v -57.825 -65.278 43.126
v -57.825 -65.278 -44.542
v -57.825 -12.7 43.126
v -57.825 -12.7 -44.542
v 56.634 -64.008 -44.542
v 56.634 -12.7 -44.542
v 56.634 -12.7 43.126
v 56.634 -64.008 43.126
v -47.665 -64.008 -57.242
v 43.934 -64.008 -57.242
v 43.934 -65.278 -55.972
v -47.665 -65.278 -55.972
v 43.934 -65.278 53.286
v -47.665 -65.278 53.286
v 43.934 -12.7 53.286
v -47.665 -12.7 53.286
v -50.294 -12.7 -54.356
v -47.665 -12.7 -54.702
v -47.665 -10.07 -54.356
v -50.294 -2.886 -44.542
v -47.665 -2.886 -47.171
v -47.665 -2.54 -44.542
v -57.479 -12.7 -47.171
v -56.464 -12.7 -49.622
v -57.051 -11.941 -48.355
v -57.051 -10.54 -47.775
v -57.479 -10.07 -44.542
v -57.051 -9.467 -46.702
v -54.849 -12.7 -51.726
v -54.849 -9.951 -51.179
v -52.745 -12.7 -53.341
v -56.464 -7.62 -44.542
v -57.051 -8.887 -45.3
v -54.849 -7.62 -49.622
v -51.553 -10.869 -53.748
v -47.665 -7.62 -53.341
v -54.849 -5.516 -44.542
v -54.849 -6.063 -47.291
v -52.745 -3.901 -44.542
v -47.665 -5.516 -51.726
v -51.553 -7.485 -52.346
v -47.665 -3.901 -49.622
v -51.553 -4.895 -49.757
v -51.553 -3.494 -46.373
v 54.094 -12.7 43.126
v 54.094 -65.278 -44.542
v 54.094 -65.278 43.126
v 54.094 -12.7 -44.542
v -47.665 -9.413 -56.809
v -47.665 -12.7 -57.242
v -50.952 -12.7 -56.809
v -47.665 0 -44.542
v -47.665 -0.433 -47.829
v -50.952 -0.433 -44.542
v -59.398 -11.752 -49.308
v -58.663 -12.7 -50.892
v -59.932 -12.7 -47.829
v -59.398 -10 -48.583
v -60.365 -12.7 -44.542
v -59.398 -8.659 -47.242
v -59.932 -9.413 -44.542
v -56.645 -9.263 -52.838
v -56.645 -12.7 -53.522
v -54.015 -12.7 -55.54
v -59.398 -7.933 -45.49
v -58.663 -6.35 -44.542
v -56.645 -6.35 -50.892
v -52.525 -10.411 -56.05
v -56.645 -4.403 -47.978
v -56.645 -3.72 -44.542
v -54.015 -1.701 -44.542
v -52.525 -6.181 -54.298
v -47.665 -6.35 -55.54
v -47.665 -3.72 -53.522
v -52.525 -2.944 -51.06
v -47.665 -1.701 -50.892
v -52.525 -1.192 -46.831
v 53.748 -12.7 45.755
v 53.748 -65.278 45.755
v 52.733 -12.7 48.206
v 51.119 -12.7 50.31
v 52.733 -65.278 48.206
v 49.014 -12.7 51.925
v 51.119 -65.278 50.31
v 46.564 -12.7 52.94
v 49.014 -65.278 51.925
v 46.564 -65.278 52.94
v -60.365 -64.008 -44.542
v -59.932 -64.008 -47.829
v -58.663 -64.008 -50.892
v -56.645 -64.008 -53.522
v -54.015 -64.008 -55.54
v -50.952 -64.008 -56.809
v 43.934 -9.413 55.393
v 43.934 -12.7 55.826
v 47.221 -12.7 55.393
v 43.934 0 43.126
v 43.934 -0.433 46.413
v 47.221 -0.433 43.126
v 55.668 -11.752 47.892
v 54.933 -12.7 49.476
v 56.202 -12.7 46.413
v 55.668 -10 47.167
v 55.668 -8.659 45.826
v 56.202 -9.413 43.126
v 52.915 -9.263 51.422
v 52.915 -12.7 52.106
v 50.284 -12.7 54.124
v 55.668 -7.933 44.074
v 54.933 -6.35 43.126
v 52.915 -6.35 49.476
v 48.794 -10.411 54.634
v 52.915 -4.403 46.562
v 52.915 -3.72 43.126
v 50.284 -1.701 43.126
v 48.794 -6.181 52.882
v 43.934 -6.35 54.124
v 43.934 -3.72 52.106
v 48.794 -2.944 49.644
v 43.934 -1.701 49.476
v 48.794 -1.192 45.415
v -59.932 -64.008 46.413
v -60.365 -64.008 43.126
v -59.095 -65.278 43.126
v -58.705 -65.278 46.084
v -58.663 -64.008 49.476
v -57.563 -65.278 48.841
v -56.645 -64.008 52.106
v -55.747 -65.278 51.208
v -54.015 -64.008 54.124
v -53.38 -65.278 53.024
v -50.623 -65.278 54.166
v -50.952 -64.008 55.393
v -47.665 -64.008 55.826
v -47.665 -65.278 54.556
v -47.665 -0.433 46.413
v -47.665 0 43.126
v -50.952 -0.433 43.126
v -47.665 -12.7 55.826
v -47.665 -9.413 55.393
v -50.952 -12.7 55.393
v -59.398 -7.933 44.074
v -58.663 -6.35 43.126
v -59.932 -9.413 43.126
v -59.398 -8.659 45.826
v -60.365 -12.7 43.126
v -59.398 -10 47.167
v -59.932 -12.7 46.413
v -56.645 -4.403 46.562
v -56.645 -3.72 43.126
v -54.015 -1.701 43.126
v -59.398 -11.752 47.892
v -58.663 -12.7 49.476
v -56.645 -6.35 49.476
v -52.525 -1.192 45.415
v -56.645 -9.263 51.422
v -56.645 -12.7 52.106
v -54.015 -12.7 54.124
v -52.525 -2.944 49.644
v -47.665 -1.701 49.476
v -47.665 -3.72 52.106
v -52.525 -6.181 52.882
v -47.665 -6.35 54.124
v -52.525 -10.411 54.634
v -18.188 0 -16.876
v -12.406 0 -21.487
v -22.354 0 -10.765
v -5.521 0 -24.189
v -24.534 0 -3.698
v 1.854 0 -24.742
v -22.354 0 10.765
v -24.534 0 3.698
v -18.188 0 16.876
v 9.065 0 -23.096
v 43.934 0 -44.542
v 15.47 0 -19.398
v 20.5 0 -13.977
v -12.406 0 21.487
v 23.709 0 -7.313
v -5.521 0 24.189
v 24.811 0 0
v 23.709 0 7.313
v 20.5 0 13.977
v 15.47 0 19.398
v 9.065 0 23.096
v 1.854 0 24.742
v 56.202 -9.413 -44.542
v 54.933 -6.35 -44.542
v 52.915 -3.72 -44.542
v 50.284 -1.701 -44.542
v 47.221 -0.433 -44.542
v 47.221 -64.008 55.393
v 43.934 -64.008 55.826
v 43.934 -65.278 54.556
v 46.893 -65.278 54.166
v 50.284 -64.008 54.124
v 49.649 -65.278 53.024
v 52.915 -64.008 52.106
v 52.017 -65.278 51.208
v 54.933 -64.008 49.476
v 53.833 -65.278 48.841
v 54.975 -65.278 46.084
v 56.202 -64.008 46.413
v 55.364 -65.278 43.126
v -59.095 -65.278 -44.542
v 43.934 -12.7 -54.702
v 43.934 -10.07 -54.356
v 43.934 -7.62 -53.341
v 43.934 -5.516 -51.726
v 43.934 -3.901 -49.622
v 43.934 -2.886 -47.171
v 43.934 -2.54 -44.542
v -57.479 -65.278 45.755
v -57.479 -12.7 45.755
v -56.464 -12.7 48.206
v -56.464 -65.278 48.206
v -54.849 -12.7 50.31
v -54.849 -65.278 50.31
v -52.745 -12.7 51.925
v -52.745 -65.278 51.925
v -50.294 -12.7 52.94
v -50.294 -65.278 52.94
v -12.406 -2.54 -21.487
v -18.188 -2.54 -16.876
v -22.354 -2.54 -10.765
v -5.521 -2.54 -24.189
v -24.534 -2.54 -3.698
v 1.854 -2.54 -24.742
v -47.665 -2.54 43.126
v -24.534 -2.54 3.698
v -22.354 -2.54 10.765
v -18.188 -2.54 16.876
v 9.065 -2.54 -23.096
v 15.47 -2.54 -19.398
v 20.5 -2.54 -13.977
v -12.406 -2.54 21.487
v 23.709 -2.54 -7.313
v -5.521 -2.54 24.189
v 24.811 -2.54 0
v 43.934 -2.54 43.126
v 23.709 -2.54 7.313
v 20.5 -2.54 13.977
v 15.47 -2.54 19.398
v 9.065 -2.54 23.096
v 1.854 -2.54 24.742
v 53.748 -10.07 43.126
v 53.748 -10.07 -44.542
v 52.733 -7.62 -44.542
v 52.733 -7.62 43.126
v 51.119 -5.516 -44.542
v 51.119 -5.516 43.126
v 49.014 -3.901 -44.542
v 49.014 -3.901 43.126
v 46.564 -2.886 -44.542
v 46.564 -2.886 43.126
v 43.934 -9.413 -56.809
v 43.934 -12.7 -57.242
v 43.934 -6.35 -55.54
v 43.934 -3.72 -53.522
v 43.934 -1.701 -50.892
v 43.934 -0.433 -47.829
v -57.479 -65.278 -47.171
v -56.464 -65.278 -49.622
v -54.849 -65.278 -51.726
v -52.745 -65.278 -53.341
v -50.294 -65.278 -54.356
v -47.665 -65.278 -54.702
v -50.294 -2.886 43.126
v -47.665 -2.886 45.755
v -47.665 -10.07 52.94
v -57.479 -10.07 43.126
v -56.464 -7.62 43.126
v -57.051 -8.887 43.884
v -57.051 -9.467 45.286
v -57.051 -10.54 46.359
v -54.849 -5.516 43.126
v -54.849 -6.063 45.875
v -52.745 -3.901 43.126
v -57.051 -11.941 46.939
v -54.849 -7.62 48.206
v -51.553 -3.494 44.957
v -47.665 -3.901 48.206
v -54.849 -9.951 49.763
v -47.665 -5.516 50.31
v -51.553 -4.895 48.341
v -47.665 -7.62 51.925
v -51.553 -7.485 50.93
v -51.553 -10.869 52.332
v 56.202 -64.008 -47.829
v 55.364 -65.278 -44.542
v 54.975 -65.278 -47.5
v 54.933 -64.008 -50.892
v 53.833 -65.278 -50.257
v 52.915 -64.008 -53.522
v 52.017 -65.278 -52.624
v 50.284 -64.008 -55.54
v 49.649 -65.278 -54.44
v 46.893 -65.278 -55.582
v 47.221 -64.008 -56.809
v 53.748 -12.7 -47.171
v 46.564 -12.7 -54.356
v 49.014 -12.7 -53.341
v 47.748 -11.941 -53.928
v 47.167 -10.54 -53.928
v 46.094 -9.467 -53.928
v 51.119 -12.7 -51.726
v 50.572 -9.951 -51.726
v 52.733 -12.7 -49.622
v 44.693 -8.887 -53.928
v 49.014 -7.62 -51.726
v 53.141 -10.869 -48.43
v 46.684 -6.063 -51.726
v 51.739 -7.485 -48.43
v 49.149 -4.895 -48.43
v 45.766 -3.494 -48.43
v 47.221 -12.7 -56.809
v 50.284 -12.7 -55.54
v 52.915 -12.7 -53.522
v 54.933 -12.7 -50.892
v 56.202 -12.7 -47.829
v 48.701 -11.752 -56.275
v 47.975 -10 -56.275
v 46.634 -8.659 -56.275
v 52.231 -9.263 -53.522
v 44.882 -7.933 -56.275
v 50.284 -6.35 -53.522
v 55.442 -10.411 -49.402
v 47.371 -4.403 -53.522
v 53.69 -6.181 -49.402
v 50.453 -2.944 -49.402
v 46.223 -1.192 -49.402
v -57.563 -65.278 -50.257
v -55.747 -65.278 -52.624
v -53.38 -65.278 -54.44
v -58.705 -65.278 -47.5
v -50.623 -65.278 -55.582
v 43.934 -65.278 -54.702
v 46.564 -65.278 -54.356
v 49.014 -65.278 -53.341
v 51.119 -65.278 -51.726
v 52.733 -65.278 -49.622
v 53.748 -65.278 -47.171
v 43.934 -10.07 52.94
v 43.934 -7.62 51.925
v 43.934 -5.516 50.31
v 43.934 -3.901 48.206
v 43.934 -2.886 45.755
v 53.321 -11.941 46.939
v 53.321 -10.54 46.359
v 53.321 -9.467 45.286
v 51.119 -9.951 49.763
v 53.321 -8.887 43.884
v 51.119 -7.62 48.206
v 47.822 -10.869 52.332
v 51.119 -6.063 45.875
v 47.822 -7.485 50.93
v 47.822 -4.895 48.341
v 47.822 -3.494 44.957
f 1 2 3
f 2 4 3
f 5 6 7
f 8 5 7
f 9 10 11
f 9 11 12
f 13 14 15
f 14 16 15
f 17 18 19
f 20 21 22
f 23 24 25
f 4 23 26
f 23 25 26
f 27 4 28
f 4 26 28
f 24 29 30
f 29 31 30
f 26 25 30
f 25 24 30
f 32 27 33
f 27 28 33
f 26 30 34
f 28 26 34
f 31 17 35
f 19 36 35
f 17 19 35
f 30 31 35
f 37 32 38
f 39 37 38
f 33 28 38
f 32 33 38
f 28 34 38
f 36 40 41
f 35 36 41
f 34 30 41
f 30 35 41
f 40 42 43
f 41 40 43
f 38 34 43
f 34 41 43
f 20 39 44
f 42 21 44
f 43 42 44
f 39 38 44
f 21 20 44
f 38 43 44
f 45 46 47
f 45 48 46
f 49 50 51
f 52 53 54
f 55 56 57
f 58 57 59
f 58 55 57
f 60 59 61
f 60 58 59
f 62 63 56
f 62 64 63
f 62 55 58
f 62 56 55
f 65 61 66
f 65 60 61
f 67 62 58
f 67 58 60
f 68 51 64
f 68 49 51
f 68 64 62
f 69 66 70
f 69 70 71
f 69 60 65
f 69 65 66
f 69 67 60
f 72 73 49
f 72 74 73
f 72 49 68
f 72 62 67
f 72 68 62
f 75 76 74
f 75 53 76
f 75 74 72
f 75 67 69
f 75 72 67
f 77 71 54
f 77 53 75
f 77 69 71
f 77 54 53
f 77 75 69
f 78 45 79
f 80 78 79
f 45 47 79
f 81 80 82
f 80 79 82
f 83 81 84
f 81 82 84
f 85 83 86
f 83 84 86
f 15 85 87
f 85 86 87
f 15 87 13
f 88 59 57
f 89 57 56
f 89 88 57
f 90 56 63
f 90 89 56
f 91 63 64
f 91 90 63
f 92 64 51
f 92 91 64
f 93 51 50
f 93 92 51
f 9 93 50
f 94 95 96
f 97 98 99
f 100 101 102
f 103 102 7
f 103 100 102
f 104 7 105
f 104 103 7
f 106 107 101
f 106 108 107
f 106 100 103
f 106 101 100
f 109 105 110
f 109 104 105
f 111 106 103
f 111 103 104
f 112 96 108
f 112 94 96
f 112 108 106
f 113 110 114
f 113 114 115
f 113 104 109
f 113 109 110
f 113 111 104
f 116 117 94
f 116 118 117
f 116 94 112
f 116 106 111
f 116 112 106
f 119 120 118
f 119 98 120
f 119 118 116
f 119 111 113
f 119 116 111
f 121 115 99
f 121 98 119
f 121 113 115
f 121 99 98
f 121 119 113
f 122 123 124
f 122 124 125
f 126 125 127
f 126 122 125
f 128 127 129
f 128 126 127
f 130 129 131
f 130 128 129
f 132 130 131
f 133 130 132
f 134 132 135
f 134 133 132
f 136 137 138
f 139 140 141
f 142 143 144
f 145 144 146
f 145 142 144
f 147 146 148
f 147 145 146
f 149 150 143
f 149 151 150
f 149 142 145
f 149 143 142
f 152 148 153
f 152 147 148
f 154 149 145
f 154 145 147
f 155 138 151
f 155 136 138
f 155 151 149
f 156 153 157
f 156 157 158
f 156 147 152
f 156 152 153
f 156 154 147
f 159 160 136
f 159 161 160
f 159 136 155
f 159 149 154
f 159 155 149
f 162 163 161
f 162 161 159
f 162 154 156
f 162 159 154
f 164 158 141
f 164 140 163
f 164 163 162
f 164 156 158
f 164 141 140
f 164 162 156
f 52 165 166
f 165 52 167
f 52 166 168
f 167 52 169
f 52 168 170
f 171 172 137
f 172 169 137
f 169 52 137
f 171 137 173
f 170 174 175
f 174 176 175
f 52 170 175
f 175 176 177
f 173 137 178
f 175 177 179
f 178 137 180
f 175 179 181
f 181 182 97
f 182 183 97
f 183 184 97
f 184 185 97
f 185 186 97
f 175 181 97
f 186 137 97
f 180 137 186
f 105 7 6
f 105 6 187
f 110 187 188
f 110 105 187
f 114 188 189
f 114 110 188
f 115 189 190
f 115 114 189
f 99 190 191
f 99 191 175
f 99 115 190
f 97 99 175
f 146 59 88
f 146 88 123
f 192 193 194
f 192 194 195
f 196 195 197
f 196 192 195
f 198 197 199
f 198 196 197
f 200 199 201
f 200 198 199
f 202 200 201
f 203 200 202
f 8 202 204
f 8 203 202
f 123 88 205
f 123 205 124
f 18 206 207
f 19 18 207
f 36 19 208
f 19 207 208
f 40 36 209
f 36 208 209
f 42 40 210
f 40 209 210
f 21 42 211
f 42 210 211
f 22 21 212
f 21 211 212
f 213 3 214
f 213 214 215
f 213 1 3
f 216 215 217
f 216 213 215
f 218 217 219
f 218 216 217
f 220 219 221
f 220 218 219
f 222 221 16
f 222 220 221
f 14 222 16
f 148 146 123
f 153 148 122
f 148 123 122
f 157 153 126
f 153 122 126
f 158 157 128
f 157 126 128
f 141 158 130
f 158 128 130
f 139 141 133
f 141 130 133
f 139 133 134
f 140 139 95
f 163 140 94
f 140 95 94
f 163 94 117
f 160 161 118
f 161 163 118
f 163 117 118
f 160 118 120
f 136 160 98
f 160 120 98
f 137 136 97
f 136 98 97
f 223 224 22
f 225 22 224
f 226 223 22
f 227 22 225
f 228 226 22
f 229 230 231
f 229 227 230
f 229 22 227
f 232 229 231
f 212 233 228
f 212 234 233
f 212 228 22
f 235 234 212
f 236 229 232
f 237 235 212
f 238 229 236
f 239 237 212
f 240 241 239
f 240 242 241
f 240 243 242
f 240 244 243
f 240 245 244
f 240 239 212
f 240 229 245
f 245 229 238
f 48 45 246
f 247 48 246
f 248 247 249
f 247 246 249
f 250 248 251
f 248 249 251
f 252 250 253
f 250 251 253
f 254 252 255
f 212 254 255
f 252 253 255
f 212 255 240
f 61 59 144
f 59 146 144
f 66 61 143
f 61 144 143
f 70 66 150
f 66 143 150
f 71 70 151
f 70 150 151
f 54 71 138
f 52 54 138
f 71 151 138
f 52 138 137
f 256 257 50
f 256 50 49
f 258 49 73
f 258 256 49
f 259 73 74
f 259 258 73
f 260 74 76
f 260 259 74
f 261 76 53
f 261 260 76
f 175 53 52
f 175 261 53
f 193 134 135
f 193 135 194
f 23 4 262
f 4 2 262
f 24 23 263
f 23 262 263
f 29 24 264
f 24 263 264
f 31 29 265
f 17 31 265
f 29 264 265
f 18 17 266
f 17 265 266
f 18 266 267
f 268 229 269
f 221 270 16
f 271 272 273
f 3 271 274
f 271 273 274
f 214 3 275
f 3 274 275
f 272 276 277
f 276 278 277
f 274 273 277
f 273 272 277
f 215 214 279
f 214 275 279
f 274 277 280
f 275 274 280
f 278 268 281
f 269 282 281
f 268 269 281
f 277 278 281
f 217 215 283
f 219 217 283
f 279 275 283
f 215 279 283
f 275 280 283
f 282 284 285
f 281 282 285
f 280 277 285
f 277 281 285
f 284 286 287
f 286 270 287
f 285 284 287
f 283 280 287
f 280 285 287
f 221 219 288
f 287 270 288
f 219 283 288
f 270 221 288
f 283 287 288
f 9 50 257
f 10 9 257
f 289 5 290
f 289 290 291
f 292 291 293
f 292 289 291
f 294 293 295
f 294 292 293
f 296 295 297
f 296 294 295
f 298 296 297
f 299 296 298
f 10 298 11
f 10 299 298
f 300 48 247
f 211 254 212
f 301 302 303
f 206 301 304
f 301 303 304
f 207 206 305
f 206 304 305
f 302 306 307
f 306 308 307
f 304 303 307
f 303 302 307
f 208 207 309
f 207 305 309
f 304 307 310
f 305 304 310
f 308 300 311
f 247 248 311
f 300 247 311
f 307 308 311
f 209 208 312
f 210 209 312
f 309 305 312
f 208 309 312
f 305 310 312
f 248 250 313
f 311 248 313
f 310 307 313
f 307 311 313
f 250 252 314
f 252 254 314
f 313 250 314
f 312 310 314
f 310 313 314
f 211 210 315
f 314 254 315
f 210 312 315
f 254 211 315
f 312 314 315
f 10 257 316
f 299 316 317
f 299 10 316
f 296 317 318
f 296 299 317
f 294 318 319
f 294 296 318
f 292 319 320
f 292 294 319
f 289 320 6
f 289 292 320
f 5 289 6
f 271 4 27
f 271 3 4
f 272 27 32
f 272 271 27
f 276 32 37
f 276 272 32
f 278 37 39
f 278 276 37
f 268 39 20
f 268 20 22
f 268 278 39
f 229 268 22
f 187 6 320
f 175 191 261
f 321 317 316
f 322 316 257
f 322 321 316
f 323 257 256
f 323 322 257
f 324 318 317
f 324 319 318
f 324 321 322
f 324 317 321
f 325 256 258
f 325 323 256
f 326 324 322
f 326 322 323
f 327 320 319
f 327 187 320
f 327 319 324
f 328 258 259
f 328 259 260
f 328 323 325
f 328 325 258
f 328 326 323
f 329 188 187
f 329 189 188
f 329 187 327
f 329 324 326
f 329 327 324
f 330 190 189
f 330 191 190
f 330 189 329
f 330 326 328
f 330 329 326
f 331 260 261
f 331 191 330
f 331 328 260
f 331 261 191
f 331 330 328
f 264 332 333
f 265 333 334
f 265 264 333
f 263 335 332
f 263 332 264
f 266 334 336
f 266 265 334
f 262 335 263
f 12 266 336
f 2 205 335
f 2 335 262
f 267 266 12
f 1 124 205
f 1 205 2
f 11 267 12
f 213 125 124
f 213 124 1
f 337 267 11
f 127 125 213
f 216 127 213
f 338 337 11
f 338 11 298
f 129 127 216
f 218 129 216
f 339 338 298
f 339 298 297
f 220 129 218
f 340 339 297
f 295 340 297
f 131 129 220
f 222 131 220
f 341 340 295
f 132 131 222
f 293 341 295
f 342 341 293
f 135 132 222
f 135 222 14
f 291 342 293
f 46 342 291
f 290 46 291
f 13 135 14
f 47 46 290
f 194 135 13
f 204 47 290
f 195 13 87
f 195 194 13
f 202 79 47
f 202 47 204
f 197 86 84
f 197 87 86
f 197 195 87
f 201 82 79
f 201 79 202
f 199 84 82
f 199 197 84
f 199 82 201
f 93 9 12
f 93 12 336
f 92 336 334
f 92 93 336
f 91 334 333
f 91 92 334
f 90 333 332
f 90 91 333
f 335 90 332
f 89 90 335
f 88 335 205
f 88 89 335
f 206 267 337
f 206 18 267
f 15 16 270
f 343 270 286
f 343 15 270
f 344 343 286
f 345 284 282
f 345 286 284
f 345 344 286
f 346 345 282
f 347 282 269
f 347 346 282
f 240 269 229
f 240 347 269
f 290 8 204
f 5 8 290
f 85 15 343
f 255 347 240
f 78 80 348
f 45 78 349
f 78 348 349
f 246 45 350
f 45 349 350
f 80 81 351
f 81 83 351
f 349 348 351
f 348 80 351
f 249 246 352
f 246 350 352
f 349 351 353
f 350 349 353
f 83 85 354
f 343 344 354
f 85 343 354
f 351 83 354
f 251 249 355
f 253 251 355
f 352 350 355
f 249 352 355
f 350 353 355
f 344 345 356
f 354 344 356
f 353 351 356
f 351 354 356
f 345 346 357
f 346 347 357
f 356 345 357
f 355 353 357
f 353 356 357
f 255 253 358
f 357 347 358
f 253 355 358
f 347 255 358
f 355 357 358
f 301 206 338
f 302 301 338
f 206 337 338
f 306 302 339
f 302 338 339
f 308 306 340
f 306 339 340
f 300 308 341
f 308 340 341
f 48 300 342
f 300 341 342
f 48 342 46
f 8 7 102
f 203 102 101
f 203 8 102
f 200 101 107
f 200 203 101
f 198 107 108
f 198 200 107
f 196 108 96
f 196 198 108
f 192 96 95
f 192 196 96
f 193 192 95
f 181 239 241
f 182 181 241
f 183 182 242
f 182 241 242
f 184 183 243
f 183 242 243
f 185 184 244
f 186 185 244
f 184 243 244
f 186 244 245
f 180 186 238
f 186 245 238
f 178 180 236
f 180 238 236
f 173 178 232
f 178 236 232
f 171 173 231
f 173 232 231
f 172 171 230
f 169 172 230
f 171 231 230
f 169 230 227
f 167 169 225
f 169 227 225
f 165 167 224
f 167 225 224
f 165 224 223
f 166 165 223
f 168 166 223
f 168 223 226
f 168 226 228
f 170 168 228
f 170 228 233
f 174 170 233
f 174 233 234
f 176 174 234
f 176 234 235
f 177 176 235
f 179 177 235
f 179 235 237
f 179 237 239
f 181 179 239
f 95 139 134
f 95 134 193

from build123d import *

# Parameters (mm, degrees)
F0_W     = 116.999064
F0_H     = 113.067575
F1_DEPTH = 65.278
F2_R     = 12.7
F3_T     = -2.54
F4_R     = 24.811163
F5_DEPTH = 64.008
F6_SIZE  = 1.27


with BuildPart() as f1:
    # F0 (on Front) → F1 (new body)
    with BuildSketch(Plane.XZ):
        with Locations((-1.865206, -0.708006)):
            Rectangle(F0_W, F0_H)
    extrude(amount=F1_DEPTH)

    # F2
    f2_edges = [f1.edges().sort_by_distance(p)[0] for p in [
        (-1.865206, 0, 55.825781),
        (56.634326, -32.639, 55.825781),
        (56.634326, 0, -0.708006),
        (56.634326, -32.639, -57.241794),
        (-1.865206, 0, -57.241794),
        (-60.364738, -32.639, -57.241794),
        (-60.364738, 0, -0.708006),
        (-60.364738, -32.639, 55.825781),
    ]]
    fillet(f2_edges, radius=F2_R)

    # F3
    f3_openings = [f1.faces().sort_by_distance(p)[0] for p in [
        (-1.865206, -65.278, -0.708006),
    ]]
    offset(amount=F3_T, openings=f3_openings)

    # F4 (on face) → F5 (cut)
    with BuildSketch(Plane.XZ.offset(2.54)):
        Circle(F4_R)
    extrude(amount=-F5_DEPTH, mode=Mode.SUBTRACT)

    # F6
    f6_edges = [f1.edges().sort_by_distance(p)[0] for p in [
        (-1.865206, -65.278, 55.825781),
    ]]
    chamfer(f6_edges, length=F6_SIZE)


solid = f1.part
